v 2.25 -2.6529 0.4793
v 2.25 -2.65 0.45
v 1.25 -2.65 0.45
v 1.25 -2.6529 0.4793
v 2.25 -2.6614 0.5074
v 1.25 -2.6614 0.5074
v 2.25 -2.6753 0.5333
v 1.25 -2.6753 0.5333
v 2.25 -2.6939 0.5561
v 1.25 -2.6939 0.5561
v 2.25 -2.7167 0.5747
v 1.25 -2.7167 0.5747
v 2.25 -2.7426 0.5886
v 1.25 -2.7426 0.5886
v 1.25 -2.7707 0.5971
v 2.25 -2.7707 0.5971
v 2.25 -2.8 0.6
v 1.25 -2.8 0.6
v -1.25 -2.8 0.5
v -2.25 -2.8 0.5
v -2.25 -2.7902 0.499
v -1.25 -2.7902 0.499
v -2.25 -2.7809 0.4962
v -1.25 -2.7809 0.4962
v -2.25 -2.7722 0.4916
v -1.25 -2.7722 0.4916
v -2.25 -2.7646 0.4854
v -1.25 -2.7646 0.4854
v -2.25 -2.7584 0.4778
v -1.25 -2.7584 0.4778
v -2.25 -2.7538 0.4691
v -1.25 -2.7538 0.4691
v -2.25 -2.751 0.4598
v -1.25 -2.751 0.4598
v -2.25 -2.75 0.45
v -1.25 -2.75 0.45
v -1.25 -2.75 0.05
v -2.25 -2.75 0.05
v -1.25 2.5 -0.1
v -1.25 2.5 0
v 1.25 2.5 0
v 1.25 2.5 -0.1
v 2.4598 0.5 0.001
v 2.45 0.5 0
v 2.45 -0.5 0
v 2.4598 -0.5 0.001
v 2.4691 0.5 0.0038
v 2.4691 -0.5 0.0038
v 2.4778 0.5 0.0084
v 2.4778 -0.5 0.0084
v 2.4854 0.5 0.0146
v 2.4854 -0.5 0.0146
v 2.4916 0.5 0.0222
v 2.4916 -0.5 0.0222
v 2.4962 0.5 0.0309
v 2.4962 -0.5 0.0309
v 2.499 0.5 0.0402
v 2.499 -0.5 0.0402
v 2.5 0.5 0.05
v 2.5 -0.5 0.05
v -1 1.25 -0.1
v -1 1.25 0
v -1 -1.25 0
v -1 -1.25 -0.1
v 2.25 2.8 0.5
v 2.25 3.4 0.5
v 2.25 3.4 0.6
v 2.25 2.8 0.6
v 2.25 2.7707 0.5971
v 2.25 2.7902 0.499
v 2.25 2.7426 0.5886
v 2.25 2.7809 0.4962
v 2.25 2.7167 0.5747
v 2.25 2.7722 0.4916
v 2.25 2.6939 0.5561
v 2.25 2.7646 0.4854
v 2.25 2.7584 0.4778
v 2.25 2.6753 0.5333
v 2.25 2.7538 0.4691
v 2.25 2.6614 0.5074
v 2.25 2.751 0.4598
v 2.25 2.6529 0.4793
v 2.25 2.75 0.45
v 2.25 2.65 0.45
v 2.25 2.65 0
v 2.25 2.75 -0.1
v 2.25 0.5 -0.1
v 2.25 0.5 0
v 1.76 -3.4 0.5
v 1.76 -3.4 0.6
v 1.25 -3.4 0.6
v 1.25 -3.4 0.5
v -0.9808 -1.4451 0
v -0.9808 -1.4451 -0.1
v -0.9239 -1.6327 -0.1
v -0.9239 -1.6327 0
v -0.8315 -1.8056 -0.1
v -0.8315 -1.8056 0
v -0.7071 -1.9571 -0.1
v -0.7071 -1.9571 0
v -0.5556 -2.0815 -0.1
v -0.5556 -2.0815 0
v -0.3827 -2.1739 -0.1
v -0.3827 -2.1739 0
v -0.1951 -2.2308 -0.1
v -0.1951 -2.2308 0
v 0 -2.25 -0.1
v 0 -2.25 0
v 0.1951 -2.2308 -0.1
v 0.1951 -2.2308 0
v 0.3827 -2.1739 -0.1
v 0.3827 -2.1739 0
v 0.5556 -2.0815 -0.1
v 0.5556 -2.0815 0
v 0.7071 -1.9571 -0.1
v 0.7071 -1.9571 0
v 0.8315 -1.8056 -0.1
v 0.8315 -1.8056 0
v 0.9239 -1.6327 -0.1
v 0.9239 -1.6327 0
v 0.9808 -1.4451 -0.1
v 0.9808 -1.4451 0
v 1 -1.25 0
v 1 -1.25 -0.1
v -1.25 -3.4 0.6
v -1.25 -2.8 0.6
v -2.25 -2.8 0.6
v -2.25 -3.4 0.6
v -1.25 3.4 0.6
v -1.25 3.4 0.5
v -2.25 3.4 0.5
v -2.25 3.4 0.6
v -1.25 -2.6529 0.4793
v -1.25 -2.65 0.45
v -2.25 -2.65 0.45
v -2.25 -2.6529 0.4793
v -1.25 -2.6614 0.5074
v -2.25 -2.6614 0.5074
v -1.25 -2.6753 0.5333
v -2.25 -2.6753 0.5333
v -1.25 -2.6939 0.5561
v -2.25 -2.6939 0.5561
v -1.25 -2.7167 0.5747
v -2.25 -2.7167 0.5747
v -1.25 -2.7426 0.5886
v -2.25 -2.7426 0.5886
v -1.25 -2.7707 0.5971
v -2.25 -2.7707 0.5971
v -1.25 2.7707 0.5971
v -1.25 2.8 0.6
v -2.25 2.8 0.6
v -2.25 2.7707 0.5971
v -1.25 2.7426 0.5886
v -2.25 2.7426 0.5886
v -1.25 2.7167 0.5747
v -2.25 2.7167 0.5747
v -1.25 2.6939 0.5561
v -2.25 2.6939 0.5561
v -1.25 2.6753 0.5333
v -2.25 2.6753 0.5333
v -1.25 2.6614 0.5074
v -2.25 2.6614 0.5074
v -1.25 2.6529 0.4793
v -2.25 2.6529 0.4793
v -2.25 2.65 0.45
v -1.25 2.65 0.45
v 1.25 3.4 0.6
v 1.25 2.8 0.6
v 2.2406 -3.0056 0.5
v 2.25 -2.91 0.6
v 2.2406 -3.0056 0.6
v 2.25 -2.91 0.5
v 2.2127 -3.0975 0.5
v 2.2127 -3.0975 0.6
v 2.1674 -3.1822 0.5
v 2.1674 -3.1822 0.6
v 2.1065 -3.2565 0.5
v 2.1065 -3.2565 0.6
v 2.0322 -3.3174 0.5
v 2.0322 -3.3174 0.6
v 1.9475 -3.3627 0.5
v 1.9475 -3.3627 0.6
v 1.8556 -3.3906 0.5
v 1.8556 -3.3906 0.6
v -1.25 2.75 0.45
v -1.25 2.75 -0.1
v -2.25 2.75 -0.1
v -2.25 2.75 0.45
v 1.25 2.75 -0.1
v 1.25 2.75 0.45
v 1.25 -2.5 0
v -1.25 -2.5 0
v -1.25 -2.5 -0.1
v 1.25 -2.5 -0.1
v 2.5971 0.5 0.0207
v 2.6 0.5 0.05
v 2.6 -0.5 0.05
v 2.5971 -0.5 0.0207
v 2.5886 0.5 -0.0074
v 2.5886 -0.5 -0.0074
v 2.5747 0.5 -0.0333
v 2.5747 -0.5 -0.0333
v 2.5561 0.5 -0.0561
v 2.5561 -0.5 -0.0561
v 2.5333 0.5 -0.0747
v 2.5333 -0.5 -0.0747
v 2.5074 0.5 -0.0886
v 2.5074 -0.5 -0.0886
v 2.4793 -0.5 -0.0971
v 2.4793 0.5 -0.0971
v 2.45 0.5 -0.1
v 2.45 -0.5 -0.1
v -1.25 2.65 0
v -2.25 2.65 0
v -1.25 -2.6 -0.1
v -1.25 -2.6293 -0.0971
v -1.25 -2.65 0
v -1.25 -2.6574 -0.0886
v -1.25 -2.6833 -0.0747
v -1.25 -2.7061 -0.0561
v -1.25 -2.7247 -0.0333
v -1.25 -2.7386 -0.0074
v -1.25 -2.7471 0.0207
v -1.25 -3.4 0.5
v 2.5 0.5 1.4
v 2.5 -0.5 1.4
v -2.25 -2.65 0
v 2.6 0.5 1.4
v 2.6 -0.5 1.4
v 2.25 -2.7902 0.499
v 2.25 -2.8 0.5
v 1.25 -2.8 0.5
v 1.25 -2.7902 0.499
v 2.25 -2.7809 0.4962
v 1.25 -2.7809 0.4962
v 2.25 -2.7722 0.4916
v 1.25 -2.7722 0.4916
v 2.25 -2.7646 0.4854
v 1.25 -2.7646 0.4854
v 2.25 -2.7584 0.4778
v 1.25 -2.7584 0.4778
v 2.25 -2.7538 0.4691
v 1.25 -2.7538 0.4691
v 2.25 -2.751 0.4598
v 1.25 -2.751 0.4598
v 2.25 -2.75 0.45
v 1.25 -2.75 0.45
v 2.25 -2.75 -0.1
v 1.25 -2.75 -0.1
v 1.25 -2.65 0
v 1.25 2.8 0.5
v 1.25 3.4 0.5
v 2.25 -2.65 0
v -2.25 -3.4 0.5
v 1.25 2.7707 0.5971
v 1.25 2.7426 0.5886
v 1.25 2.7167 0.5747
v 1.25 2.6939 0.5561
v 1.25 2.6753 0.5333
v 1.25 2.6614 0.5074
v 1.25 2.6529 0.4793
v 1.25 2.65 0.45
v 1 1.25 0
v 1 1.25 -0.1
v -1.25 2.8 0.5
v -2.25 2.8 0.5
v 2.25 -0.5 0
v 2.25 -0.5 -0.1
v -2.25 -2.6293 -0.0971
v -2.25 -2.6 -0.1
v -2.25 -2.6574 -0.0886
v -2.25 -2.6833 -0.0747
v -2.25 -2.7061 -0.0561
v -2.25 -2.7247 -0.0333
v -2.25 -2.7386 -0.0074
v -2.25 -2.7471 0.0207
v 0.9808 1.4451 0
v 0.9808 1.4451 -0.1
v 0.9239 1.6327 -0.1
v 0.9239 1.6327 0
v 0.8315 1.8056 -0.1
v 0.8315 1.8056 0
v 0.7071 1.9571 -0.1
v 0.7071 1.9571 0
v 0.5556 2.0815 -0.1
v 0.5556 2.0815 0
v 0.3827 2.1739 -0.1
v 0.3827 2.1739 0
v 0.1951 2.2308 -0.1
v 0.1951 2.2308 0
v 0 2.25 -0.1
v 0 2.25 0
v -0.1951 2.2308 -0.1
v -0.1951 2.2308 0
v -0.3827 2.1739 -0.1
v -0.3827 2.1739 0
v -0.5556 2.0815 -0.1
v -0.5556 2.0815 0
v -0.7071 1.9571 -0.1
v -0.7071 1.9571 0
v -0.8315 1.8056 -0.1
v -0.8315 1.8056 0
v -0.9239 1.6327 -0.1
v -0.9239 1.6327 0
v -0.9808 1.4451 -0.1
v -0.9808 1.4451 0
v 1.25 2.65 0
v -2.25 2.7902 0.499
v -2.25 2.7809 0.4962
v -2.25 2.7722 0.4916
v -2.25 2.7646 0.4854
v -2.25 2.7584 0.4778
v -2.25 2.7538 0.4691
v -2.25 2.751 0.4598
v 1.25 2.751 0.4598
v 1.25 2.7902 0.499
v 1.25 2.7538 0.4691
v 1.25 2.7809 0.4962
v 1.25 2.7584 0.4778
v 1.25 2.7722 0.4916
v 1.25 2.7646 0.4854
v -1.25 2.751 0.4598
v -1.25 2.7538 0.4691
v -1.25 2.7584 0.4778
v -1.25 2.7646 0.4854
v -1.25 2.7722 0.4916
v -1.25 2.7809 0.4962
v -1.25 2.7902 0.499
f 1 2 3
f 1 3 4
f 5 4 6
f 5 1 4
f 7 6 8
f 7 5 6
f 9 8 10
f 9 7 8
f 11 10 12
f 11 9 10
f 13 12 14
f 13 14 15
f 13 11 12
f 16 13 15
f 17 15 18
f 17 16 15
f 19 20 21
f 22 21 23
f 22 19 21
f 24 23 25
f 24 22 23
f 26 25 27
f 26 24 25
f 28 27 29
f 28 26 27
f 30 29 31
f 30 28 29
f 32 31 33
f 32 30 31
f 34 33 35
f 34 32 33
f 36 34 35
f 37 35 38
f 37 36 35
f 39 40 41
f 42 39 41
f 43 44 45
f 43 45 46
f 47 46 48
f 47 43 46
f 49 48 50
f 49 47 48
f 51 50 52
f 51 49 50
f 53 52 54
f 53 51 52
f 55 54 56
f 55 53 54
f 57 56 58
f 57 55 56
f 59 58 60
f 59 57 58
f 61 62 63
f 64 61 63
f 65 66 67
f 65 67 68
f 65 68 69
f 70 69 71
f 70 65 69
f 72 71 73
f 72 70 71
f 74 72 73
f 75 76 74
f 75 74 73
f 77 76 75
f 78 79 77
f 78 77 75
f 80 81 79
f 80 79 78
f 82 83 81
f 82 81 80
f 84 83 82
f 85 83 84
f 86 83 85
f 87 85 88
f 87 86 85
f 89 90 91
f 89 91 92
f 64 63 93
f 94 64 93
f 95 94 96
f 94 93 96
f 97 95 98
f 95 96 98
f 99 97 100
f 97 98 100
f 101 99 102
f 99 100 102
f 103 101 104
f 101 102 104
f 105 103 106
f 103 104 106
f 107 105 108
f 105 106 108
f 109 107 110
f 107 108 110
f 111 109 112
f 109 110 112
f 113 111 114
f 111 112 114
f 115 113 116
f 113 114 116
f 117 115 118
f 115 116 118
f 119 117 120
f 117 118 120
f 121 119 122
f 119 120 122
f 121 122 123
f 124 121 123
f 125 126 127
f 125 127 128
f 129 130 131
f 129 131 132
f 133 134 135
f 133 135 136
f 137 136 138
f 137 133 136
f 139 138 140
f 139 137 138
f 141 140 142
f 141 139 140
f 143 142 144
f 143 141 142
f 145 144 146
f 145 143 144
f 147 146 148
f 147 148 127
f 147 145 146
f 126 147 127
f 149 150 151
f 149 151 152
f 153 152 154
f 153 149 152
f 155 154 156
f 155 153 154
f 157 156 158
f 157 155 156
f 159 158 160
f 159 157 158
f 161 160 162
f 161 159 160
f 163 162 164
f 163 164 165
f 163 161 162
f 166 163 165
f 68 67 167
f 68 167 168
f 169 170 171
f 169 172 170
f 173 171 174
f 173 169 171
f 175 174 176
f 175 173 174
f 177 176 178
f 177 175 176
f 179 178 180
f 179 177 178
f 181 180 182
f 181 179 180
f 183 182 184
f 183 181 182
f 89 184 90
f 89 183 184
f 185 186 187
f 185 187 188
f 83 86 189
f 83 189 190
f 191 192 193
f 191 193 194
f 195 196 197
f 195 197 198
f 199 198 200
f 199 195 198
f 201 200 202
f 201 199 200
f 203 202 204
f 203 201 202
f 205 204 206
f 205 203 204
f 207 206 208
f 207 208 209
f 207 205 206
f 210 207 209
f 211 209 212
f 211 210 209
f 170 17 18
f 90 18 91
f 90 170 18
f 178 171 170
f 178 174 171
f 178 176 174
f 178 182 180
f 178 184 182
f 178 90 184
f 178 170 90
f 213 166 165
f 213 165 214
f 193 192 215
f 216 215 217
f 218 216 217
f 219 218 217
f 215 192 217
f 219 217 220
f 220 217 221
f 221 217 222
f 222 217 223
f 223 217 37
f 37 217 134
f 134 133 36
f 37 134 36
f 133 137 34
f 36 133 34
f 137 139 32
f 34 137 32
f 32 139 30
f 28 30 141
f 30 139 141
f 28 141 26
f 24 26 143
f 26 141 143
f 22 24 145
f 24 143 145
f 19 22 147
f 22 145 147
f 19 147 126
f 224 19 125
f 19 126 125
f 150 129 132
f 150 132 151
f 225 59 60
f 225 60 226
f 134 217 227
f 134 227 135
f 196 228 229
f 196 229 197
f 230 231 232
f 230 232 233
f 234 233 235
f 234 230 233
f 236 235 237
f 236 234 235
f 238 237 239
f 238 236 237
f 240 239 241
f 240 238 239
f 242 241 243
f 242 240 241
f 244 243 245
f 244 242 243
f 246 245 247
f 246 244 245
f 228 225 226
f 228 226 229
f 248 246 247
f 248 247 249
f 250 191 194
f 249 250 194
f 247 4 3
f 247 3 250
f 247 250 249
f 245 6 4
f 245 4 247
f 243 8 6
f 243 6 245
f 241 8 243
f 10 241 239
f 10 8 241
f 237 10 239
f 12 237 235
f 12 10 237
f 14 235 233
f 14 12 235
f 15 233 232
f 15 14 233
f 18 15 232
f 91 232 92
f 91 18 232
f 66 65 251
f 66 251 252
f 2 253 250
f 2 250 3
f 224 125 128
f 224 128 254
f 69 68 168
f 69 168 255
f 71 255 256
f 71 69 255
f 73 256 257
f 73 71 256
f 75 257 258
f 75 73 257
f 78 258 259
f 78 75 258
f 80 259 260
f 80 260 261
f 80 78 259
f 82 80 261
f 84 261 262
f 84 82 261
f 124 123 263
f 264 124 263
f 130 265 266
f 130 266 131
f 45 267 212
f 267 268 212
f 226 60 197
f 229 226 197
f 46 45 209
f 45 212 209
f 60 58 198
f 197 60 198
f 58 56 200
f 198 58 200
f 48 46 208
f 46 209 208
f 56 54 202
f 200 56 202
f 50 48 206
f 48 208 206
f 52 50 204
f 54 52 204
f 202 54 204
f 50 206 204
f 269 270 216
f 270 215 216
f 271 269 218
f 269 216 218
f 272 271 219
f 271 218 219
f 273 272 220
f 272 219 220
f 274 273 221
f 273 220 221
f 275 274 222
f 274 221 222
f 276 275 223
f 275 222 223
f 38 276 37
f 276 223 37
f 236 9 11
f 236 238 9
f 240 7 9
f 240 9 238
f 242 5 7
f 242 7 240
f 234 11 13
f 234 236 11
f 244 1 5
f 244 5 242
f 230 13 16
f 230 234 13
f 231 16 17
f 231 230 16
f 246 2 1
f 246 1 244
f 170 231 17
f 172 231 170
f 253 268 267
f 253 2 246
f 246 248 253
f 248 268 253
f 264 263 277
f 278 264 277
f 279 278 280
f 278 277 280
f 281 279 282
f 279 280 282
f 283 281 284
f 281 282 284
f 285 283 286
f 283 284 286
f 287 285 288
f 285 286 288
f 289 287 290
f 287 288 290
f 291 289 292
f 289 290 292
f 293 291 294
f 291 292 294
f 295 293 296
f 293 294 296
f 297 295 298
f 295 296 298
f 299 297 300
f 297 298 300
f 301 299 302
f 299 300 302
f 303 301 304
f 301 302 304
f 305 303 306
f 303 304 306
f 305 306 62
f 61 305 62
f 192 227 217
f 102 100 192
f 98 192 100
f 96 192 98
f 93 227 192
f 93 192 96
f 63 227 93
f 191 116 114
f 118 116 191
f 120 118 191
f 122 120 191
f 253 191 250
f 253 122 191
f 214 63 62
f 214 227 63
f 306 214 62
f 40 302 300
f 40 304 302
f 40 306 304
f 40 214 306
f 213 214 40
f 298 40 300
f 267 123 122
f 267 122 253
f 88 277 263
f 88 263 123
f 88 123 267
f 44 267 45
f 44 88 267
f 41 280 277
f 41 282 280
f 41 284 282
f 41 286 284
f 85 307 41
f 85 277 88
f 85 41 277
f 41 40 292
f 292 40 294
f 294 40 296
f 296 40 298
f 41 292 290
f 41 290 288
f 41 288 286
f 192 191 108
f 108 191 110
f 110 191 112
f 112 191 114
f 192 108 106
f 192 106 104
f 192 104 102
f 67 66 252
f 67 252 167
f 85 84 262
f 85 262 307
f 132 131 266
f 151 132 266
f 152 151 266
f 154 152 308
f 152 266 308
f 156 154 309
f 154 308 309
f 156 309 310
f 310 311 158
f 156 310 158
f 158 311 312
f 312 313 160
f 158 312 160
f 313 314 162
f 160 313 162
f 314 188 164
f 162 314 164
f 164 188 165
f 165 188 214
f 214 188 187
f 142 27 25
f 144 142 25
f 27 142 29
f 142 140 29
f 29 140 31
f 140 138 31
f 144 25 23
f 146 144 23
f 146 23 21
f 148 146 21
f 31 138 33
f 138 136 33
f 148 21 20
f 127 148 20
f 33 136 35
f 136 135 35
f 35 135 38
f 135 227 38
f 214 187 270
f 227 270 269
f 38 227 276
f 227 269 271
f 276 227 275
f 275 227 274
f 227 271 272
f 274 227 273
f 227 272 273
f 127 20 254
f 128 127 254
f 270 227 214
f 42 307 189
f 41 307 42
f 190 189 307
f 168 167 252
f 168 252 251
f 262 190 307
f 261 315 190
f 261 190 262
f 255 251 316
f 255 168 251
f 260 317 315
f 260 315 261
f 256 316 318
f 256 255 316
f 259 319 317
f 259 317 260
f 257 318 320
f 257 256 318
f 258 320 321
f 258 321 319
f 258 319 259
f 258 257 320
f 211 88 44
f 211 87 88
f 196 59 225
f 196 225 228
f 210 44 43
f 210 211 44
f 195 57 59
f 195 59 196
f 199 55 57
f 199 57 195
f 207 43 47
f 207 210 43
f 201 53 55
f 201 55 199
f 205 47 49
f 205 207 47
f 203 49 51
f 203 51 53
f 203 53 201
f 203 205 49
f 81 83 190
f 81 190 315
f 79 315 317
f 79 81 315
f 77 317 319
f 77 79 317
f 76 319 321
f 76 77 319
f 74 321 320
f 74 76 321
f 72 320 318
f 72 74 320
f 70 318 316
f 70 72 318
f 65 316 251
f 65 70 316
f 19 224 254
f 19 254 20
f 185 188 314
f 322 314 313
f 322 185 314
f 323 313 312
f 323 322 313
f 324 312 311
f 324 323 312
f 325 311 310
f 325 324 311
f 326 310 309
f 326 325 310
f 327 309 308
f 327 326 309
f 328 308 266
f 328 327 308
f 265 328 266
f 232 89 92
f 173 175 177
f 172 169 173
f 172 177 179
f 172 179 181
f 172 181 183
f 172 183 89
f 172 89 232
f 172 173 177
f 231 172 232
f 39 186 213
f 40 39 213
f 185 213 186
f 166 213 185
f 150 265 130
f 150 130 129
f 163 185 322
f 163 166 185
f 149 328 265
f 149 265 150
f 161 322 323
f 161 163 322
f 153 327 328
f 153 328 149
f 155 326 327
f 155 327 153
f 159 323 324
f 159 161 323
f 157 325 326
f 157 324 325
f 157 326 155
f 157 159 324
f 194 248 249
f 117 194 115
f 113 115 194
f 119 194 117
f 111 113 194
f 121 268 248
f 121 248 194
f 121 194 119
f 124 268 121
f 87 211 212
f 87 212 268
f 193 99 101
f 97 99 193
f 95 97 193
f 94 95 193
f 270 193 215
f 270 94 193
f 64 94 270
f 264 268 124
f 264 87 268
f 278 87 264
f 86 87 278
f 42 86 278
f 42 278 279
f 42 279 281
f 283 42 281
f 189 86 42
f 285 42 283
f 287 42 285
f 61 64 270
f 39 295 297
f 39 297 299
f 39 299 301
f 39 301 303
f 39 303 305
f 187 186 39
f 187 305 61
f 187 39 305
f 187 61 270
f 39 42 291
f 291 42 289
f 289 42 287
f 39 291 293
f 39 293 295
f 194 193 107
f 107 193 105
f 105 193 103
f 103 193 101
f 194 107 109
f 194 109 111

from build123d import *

# Parameters (mm, degrees)
EXTRUDE_THIN2_DEPTH      = 2.25
EXTRUDE_THIN2_DEPTH_BACK = 2.25
SKETCH2_W                = 2.5
SKETCH2_H                = 0.8
EXTRUDE1_DEPTH           = 4
EXTRUDE1_DEPTH_BACK      = 4
S2D0010_W                = 0.5
S2D0010_H                = 2.5
EXTRUDE2_DEPTH           = 0.17
EXTRUDE_THIN3_DEPTH      = 0.5
EXTRUDE_THIN3_DEPTH_BACK = 0.5
FILLET1_R                = 0.15
FILLET2_R                = 0.49


with BuildPart() as part:
    # Sketch1 → Extrude-Thin2 (new body, two sides)
    with BuildSketch(Plane(origin=(0, 0, 0), x_dir=(0, -1, 0), z_dir=(1, 0, 0))) as extrude_thin2_sk:
        with BuildLine():
            Line((-3.4, -0.6), (-2.8, -0.6))
            ThreePointArc((-2.8, -0.6), (-2.693933983, -0.556066017), (-2.65, -0.45))
            Line((-2.65, -0.45), (-2.65, 0))
            Line((-2.65, 0), (2.65, 0))
            Line((2.65, 0), (2.65, -0.45))
            ThreePointArc((2.65, -0.45), (2.693933983, -0.556066017), (2.8, -0.6))
            Line((2.8, -0.6), (3.4, -0.6))
            Line((3.4, -0.6), (3.4, -0.5))
            Line((3.4, -0.5), (2.8, -0.5))
            ThreePointArc((2.8, -0.5), (2.764644661, -0.485355339), (2.75, -0.45))
            Line((2.75, -0.45), (2.75, 0.1))
            Line((2.75, 0.1), (-2.75, 0.1))
            Line((-2.75, 0.1), (-2.75, -0.45))
            ThreePointArc((-2.75, -0.45), (-2.764644661, -0.485355339), (-2.8, -0.5))
            Line((-2.8, -0.5), (-3.4, -0.5))
            Line((-3.4, -0.5), (-3.4, -0.6))
        make_face()
    extrude(amount=EXTRUDE_THIN2_DEPTH)
    extrude(extrude_thin2_sk.sketch, amount=-EXTRUDE_THIN2_DEPTH_BACK)

    # Sketch2 → Extrude1 (cut, two sides)
    with BuildSketch(Plane(origin=(0, 0, 0), x_dir=(-1, 0, 0), z_dir=(0, 1, 0))) as extrude1_sk:
        with Locations((0, 0.4)):
            Rectangle(SKETCH2_W, SKETCH2_H)
    extrude(amount=EXTRUDE1_DEPTH, mode=Mode.SUBTRACT)
    extrude(extrude1_sk.sketch, amount=-EXTRUDE1_DEPTH_BACK, mode=Mode.SUBTRACT)

    # S2D0010 → Extrude2 (cut)
    with BuildSketch(Plane(origin=(0, 0, 0), x_dir=(0, -1, 0), z_dir=(0, 0, 1))):
        with BuildLine():
            Line((1.25, 1), (-1.25, 1))
            ThreePointArc((-1.25, 1), (-2.25, 0), (-1.25, -1))
            Line((-1.25, -1), (1.25, -1))
            ThreePointArc((1.25, -1), (2.25, 0), (1.25, 1))
        make_face()
        with Locations((2.75, 0)):
            Rectangle(S2D0010_W, S2D0010_H)
        with Locations((-2.75, 0)):
            Rectangle(S2D0010_W, S2D0010_H)
    extrude(amount=-EXTRUDE2_DEPTH, mode=Mode.SUBTRACT)

    # S2D0012 → Extrude-Thin3 (add, two sides)
    with BuildSketch(Plane(origin=(0, 0, 0), x_dir=(1, 0, 0), z_dir=(0, 1, 0))) as extrude_thin3_sk:
        with BuildLine():
            Line((2.25, 0), (2.45, 0))
            ThreePointArc((2.45, 0), (2.485355339, -0.014644661), (2.5, -0.05))
            Line((2.5, -0.05), (2.5, -1.4))
            Line((2.5, -1.4), (2.6, -1.4))
            Line((2.6, -1.4), (2.6, -0.05))
            ThreePointArc((2.6, -0.05), (2.556066017, 0.056066017), (2.45, 0.1))
            Line((2.45, 0.1), (2.25, 0.1))
            Line((2.25, 0.1), (2.25, 0))
        make_face()
    extrude(amount=EXTRUDE_THIN3_DEPTH)
    extrude(extrude_thin3_sk.sketch, amount=-EXTRUDE_THIN3_DEPTH_BACK)

    # Fillet1
    fillet1_edges = [part.edges().sort_by_distance(p)[0] for p in [
        (-1.75, -2.75, -0.1),
    ]]
    fillet(fillet1_edges, radius=FILLET1_R)

    # Fillet2
    fillet2_edges = [part.edges().sort_by_distance(p)[0] for p in [
        (2.25, -3.4, 0.55),
    ]]
    fillet(fillet2_edges, radius=FILLET2_R)


solid = part.part
